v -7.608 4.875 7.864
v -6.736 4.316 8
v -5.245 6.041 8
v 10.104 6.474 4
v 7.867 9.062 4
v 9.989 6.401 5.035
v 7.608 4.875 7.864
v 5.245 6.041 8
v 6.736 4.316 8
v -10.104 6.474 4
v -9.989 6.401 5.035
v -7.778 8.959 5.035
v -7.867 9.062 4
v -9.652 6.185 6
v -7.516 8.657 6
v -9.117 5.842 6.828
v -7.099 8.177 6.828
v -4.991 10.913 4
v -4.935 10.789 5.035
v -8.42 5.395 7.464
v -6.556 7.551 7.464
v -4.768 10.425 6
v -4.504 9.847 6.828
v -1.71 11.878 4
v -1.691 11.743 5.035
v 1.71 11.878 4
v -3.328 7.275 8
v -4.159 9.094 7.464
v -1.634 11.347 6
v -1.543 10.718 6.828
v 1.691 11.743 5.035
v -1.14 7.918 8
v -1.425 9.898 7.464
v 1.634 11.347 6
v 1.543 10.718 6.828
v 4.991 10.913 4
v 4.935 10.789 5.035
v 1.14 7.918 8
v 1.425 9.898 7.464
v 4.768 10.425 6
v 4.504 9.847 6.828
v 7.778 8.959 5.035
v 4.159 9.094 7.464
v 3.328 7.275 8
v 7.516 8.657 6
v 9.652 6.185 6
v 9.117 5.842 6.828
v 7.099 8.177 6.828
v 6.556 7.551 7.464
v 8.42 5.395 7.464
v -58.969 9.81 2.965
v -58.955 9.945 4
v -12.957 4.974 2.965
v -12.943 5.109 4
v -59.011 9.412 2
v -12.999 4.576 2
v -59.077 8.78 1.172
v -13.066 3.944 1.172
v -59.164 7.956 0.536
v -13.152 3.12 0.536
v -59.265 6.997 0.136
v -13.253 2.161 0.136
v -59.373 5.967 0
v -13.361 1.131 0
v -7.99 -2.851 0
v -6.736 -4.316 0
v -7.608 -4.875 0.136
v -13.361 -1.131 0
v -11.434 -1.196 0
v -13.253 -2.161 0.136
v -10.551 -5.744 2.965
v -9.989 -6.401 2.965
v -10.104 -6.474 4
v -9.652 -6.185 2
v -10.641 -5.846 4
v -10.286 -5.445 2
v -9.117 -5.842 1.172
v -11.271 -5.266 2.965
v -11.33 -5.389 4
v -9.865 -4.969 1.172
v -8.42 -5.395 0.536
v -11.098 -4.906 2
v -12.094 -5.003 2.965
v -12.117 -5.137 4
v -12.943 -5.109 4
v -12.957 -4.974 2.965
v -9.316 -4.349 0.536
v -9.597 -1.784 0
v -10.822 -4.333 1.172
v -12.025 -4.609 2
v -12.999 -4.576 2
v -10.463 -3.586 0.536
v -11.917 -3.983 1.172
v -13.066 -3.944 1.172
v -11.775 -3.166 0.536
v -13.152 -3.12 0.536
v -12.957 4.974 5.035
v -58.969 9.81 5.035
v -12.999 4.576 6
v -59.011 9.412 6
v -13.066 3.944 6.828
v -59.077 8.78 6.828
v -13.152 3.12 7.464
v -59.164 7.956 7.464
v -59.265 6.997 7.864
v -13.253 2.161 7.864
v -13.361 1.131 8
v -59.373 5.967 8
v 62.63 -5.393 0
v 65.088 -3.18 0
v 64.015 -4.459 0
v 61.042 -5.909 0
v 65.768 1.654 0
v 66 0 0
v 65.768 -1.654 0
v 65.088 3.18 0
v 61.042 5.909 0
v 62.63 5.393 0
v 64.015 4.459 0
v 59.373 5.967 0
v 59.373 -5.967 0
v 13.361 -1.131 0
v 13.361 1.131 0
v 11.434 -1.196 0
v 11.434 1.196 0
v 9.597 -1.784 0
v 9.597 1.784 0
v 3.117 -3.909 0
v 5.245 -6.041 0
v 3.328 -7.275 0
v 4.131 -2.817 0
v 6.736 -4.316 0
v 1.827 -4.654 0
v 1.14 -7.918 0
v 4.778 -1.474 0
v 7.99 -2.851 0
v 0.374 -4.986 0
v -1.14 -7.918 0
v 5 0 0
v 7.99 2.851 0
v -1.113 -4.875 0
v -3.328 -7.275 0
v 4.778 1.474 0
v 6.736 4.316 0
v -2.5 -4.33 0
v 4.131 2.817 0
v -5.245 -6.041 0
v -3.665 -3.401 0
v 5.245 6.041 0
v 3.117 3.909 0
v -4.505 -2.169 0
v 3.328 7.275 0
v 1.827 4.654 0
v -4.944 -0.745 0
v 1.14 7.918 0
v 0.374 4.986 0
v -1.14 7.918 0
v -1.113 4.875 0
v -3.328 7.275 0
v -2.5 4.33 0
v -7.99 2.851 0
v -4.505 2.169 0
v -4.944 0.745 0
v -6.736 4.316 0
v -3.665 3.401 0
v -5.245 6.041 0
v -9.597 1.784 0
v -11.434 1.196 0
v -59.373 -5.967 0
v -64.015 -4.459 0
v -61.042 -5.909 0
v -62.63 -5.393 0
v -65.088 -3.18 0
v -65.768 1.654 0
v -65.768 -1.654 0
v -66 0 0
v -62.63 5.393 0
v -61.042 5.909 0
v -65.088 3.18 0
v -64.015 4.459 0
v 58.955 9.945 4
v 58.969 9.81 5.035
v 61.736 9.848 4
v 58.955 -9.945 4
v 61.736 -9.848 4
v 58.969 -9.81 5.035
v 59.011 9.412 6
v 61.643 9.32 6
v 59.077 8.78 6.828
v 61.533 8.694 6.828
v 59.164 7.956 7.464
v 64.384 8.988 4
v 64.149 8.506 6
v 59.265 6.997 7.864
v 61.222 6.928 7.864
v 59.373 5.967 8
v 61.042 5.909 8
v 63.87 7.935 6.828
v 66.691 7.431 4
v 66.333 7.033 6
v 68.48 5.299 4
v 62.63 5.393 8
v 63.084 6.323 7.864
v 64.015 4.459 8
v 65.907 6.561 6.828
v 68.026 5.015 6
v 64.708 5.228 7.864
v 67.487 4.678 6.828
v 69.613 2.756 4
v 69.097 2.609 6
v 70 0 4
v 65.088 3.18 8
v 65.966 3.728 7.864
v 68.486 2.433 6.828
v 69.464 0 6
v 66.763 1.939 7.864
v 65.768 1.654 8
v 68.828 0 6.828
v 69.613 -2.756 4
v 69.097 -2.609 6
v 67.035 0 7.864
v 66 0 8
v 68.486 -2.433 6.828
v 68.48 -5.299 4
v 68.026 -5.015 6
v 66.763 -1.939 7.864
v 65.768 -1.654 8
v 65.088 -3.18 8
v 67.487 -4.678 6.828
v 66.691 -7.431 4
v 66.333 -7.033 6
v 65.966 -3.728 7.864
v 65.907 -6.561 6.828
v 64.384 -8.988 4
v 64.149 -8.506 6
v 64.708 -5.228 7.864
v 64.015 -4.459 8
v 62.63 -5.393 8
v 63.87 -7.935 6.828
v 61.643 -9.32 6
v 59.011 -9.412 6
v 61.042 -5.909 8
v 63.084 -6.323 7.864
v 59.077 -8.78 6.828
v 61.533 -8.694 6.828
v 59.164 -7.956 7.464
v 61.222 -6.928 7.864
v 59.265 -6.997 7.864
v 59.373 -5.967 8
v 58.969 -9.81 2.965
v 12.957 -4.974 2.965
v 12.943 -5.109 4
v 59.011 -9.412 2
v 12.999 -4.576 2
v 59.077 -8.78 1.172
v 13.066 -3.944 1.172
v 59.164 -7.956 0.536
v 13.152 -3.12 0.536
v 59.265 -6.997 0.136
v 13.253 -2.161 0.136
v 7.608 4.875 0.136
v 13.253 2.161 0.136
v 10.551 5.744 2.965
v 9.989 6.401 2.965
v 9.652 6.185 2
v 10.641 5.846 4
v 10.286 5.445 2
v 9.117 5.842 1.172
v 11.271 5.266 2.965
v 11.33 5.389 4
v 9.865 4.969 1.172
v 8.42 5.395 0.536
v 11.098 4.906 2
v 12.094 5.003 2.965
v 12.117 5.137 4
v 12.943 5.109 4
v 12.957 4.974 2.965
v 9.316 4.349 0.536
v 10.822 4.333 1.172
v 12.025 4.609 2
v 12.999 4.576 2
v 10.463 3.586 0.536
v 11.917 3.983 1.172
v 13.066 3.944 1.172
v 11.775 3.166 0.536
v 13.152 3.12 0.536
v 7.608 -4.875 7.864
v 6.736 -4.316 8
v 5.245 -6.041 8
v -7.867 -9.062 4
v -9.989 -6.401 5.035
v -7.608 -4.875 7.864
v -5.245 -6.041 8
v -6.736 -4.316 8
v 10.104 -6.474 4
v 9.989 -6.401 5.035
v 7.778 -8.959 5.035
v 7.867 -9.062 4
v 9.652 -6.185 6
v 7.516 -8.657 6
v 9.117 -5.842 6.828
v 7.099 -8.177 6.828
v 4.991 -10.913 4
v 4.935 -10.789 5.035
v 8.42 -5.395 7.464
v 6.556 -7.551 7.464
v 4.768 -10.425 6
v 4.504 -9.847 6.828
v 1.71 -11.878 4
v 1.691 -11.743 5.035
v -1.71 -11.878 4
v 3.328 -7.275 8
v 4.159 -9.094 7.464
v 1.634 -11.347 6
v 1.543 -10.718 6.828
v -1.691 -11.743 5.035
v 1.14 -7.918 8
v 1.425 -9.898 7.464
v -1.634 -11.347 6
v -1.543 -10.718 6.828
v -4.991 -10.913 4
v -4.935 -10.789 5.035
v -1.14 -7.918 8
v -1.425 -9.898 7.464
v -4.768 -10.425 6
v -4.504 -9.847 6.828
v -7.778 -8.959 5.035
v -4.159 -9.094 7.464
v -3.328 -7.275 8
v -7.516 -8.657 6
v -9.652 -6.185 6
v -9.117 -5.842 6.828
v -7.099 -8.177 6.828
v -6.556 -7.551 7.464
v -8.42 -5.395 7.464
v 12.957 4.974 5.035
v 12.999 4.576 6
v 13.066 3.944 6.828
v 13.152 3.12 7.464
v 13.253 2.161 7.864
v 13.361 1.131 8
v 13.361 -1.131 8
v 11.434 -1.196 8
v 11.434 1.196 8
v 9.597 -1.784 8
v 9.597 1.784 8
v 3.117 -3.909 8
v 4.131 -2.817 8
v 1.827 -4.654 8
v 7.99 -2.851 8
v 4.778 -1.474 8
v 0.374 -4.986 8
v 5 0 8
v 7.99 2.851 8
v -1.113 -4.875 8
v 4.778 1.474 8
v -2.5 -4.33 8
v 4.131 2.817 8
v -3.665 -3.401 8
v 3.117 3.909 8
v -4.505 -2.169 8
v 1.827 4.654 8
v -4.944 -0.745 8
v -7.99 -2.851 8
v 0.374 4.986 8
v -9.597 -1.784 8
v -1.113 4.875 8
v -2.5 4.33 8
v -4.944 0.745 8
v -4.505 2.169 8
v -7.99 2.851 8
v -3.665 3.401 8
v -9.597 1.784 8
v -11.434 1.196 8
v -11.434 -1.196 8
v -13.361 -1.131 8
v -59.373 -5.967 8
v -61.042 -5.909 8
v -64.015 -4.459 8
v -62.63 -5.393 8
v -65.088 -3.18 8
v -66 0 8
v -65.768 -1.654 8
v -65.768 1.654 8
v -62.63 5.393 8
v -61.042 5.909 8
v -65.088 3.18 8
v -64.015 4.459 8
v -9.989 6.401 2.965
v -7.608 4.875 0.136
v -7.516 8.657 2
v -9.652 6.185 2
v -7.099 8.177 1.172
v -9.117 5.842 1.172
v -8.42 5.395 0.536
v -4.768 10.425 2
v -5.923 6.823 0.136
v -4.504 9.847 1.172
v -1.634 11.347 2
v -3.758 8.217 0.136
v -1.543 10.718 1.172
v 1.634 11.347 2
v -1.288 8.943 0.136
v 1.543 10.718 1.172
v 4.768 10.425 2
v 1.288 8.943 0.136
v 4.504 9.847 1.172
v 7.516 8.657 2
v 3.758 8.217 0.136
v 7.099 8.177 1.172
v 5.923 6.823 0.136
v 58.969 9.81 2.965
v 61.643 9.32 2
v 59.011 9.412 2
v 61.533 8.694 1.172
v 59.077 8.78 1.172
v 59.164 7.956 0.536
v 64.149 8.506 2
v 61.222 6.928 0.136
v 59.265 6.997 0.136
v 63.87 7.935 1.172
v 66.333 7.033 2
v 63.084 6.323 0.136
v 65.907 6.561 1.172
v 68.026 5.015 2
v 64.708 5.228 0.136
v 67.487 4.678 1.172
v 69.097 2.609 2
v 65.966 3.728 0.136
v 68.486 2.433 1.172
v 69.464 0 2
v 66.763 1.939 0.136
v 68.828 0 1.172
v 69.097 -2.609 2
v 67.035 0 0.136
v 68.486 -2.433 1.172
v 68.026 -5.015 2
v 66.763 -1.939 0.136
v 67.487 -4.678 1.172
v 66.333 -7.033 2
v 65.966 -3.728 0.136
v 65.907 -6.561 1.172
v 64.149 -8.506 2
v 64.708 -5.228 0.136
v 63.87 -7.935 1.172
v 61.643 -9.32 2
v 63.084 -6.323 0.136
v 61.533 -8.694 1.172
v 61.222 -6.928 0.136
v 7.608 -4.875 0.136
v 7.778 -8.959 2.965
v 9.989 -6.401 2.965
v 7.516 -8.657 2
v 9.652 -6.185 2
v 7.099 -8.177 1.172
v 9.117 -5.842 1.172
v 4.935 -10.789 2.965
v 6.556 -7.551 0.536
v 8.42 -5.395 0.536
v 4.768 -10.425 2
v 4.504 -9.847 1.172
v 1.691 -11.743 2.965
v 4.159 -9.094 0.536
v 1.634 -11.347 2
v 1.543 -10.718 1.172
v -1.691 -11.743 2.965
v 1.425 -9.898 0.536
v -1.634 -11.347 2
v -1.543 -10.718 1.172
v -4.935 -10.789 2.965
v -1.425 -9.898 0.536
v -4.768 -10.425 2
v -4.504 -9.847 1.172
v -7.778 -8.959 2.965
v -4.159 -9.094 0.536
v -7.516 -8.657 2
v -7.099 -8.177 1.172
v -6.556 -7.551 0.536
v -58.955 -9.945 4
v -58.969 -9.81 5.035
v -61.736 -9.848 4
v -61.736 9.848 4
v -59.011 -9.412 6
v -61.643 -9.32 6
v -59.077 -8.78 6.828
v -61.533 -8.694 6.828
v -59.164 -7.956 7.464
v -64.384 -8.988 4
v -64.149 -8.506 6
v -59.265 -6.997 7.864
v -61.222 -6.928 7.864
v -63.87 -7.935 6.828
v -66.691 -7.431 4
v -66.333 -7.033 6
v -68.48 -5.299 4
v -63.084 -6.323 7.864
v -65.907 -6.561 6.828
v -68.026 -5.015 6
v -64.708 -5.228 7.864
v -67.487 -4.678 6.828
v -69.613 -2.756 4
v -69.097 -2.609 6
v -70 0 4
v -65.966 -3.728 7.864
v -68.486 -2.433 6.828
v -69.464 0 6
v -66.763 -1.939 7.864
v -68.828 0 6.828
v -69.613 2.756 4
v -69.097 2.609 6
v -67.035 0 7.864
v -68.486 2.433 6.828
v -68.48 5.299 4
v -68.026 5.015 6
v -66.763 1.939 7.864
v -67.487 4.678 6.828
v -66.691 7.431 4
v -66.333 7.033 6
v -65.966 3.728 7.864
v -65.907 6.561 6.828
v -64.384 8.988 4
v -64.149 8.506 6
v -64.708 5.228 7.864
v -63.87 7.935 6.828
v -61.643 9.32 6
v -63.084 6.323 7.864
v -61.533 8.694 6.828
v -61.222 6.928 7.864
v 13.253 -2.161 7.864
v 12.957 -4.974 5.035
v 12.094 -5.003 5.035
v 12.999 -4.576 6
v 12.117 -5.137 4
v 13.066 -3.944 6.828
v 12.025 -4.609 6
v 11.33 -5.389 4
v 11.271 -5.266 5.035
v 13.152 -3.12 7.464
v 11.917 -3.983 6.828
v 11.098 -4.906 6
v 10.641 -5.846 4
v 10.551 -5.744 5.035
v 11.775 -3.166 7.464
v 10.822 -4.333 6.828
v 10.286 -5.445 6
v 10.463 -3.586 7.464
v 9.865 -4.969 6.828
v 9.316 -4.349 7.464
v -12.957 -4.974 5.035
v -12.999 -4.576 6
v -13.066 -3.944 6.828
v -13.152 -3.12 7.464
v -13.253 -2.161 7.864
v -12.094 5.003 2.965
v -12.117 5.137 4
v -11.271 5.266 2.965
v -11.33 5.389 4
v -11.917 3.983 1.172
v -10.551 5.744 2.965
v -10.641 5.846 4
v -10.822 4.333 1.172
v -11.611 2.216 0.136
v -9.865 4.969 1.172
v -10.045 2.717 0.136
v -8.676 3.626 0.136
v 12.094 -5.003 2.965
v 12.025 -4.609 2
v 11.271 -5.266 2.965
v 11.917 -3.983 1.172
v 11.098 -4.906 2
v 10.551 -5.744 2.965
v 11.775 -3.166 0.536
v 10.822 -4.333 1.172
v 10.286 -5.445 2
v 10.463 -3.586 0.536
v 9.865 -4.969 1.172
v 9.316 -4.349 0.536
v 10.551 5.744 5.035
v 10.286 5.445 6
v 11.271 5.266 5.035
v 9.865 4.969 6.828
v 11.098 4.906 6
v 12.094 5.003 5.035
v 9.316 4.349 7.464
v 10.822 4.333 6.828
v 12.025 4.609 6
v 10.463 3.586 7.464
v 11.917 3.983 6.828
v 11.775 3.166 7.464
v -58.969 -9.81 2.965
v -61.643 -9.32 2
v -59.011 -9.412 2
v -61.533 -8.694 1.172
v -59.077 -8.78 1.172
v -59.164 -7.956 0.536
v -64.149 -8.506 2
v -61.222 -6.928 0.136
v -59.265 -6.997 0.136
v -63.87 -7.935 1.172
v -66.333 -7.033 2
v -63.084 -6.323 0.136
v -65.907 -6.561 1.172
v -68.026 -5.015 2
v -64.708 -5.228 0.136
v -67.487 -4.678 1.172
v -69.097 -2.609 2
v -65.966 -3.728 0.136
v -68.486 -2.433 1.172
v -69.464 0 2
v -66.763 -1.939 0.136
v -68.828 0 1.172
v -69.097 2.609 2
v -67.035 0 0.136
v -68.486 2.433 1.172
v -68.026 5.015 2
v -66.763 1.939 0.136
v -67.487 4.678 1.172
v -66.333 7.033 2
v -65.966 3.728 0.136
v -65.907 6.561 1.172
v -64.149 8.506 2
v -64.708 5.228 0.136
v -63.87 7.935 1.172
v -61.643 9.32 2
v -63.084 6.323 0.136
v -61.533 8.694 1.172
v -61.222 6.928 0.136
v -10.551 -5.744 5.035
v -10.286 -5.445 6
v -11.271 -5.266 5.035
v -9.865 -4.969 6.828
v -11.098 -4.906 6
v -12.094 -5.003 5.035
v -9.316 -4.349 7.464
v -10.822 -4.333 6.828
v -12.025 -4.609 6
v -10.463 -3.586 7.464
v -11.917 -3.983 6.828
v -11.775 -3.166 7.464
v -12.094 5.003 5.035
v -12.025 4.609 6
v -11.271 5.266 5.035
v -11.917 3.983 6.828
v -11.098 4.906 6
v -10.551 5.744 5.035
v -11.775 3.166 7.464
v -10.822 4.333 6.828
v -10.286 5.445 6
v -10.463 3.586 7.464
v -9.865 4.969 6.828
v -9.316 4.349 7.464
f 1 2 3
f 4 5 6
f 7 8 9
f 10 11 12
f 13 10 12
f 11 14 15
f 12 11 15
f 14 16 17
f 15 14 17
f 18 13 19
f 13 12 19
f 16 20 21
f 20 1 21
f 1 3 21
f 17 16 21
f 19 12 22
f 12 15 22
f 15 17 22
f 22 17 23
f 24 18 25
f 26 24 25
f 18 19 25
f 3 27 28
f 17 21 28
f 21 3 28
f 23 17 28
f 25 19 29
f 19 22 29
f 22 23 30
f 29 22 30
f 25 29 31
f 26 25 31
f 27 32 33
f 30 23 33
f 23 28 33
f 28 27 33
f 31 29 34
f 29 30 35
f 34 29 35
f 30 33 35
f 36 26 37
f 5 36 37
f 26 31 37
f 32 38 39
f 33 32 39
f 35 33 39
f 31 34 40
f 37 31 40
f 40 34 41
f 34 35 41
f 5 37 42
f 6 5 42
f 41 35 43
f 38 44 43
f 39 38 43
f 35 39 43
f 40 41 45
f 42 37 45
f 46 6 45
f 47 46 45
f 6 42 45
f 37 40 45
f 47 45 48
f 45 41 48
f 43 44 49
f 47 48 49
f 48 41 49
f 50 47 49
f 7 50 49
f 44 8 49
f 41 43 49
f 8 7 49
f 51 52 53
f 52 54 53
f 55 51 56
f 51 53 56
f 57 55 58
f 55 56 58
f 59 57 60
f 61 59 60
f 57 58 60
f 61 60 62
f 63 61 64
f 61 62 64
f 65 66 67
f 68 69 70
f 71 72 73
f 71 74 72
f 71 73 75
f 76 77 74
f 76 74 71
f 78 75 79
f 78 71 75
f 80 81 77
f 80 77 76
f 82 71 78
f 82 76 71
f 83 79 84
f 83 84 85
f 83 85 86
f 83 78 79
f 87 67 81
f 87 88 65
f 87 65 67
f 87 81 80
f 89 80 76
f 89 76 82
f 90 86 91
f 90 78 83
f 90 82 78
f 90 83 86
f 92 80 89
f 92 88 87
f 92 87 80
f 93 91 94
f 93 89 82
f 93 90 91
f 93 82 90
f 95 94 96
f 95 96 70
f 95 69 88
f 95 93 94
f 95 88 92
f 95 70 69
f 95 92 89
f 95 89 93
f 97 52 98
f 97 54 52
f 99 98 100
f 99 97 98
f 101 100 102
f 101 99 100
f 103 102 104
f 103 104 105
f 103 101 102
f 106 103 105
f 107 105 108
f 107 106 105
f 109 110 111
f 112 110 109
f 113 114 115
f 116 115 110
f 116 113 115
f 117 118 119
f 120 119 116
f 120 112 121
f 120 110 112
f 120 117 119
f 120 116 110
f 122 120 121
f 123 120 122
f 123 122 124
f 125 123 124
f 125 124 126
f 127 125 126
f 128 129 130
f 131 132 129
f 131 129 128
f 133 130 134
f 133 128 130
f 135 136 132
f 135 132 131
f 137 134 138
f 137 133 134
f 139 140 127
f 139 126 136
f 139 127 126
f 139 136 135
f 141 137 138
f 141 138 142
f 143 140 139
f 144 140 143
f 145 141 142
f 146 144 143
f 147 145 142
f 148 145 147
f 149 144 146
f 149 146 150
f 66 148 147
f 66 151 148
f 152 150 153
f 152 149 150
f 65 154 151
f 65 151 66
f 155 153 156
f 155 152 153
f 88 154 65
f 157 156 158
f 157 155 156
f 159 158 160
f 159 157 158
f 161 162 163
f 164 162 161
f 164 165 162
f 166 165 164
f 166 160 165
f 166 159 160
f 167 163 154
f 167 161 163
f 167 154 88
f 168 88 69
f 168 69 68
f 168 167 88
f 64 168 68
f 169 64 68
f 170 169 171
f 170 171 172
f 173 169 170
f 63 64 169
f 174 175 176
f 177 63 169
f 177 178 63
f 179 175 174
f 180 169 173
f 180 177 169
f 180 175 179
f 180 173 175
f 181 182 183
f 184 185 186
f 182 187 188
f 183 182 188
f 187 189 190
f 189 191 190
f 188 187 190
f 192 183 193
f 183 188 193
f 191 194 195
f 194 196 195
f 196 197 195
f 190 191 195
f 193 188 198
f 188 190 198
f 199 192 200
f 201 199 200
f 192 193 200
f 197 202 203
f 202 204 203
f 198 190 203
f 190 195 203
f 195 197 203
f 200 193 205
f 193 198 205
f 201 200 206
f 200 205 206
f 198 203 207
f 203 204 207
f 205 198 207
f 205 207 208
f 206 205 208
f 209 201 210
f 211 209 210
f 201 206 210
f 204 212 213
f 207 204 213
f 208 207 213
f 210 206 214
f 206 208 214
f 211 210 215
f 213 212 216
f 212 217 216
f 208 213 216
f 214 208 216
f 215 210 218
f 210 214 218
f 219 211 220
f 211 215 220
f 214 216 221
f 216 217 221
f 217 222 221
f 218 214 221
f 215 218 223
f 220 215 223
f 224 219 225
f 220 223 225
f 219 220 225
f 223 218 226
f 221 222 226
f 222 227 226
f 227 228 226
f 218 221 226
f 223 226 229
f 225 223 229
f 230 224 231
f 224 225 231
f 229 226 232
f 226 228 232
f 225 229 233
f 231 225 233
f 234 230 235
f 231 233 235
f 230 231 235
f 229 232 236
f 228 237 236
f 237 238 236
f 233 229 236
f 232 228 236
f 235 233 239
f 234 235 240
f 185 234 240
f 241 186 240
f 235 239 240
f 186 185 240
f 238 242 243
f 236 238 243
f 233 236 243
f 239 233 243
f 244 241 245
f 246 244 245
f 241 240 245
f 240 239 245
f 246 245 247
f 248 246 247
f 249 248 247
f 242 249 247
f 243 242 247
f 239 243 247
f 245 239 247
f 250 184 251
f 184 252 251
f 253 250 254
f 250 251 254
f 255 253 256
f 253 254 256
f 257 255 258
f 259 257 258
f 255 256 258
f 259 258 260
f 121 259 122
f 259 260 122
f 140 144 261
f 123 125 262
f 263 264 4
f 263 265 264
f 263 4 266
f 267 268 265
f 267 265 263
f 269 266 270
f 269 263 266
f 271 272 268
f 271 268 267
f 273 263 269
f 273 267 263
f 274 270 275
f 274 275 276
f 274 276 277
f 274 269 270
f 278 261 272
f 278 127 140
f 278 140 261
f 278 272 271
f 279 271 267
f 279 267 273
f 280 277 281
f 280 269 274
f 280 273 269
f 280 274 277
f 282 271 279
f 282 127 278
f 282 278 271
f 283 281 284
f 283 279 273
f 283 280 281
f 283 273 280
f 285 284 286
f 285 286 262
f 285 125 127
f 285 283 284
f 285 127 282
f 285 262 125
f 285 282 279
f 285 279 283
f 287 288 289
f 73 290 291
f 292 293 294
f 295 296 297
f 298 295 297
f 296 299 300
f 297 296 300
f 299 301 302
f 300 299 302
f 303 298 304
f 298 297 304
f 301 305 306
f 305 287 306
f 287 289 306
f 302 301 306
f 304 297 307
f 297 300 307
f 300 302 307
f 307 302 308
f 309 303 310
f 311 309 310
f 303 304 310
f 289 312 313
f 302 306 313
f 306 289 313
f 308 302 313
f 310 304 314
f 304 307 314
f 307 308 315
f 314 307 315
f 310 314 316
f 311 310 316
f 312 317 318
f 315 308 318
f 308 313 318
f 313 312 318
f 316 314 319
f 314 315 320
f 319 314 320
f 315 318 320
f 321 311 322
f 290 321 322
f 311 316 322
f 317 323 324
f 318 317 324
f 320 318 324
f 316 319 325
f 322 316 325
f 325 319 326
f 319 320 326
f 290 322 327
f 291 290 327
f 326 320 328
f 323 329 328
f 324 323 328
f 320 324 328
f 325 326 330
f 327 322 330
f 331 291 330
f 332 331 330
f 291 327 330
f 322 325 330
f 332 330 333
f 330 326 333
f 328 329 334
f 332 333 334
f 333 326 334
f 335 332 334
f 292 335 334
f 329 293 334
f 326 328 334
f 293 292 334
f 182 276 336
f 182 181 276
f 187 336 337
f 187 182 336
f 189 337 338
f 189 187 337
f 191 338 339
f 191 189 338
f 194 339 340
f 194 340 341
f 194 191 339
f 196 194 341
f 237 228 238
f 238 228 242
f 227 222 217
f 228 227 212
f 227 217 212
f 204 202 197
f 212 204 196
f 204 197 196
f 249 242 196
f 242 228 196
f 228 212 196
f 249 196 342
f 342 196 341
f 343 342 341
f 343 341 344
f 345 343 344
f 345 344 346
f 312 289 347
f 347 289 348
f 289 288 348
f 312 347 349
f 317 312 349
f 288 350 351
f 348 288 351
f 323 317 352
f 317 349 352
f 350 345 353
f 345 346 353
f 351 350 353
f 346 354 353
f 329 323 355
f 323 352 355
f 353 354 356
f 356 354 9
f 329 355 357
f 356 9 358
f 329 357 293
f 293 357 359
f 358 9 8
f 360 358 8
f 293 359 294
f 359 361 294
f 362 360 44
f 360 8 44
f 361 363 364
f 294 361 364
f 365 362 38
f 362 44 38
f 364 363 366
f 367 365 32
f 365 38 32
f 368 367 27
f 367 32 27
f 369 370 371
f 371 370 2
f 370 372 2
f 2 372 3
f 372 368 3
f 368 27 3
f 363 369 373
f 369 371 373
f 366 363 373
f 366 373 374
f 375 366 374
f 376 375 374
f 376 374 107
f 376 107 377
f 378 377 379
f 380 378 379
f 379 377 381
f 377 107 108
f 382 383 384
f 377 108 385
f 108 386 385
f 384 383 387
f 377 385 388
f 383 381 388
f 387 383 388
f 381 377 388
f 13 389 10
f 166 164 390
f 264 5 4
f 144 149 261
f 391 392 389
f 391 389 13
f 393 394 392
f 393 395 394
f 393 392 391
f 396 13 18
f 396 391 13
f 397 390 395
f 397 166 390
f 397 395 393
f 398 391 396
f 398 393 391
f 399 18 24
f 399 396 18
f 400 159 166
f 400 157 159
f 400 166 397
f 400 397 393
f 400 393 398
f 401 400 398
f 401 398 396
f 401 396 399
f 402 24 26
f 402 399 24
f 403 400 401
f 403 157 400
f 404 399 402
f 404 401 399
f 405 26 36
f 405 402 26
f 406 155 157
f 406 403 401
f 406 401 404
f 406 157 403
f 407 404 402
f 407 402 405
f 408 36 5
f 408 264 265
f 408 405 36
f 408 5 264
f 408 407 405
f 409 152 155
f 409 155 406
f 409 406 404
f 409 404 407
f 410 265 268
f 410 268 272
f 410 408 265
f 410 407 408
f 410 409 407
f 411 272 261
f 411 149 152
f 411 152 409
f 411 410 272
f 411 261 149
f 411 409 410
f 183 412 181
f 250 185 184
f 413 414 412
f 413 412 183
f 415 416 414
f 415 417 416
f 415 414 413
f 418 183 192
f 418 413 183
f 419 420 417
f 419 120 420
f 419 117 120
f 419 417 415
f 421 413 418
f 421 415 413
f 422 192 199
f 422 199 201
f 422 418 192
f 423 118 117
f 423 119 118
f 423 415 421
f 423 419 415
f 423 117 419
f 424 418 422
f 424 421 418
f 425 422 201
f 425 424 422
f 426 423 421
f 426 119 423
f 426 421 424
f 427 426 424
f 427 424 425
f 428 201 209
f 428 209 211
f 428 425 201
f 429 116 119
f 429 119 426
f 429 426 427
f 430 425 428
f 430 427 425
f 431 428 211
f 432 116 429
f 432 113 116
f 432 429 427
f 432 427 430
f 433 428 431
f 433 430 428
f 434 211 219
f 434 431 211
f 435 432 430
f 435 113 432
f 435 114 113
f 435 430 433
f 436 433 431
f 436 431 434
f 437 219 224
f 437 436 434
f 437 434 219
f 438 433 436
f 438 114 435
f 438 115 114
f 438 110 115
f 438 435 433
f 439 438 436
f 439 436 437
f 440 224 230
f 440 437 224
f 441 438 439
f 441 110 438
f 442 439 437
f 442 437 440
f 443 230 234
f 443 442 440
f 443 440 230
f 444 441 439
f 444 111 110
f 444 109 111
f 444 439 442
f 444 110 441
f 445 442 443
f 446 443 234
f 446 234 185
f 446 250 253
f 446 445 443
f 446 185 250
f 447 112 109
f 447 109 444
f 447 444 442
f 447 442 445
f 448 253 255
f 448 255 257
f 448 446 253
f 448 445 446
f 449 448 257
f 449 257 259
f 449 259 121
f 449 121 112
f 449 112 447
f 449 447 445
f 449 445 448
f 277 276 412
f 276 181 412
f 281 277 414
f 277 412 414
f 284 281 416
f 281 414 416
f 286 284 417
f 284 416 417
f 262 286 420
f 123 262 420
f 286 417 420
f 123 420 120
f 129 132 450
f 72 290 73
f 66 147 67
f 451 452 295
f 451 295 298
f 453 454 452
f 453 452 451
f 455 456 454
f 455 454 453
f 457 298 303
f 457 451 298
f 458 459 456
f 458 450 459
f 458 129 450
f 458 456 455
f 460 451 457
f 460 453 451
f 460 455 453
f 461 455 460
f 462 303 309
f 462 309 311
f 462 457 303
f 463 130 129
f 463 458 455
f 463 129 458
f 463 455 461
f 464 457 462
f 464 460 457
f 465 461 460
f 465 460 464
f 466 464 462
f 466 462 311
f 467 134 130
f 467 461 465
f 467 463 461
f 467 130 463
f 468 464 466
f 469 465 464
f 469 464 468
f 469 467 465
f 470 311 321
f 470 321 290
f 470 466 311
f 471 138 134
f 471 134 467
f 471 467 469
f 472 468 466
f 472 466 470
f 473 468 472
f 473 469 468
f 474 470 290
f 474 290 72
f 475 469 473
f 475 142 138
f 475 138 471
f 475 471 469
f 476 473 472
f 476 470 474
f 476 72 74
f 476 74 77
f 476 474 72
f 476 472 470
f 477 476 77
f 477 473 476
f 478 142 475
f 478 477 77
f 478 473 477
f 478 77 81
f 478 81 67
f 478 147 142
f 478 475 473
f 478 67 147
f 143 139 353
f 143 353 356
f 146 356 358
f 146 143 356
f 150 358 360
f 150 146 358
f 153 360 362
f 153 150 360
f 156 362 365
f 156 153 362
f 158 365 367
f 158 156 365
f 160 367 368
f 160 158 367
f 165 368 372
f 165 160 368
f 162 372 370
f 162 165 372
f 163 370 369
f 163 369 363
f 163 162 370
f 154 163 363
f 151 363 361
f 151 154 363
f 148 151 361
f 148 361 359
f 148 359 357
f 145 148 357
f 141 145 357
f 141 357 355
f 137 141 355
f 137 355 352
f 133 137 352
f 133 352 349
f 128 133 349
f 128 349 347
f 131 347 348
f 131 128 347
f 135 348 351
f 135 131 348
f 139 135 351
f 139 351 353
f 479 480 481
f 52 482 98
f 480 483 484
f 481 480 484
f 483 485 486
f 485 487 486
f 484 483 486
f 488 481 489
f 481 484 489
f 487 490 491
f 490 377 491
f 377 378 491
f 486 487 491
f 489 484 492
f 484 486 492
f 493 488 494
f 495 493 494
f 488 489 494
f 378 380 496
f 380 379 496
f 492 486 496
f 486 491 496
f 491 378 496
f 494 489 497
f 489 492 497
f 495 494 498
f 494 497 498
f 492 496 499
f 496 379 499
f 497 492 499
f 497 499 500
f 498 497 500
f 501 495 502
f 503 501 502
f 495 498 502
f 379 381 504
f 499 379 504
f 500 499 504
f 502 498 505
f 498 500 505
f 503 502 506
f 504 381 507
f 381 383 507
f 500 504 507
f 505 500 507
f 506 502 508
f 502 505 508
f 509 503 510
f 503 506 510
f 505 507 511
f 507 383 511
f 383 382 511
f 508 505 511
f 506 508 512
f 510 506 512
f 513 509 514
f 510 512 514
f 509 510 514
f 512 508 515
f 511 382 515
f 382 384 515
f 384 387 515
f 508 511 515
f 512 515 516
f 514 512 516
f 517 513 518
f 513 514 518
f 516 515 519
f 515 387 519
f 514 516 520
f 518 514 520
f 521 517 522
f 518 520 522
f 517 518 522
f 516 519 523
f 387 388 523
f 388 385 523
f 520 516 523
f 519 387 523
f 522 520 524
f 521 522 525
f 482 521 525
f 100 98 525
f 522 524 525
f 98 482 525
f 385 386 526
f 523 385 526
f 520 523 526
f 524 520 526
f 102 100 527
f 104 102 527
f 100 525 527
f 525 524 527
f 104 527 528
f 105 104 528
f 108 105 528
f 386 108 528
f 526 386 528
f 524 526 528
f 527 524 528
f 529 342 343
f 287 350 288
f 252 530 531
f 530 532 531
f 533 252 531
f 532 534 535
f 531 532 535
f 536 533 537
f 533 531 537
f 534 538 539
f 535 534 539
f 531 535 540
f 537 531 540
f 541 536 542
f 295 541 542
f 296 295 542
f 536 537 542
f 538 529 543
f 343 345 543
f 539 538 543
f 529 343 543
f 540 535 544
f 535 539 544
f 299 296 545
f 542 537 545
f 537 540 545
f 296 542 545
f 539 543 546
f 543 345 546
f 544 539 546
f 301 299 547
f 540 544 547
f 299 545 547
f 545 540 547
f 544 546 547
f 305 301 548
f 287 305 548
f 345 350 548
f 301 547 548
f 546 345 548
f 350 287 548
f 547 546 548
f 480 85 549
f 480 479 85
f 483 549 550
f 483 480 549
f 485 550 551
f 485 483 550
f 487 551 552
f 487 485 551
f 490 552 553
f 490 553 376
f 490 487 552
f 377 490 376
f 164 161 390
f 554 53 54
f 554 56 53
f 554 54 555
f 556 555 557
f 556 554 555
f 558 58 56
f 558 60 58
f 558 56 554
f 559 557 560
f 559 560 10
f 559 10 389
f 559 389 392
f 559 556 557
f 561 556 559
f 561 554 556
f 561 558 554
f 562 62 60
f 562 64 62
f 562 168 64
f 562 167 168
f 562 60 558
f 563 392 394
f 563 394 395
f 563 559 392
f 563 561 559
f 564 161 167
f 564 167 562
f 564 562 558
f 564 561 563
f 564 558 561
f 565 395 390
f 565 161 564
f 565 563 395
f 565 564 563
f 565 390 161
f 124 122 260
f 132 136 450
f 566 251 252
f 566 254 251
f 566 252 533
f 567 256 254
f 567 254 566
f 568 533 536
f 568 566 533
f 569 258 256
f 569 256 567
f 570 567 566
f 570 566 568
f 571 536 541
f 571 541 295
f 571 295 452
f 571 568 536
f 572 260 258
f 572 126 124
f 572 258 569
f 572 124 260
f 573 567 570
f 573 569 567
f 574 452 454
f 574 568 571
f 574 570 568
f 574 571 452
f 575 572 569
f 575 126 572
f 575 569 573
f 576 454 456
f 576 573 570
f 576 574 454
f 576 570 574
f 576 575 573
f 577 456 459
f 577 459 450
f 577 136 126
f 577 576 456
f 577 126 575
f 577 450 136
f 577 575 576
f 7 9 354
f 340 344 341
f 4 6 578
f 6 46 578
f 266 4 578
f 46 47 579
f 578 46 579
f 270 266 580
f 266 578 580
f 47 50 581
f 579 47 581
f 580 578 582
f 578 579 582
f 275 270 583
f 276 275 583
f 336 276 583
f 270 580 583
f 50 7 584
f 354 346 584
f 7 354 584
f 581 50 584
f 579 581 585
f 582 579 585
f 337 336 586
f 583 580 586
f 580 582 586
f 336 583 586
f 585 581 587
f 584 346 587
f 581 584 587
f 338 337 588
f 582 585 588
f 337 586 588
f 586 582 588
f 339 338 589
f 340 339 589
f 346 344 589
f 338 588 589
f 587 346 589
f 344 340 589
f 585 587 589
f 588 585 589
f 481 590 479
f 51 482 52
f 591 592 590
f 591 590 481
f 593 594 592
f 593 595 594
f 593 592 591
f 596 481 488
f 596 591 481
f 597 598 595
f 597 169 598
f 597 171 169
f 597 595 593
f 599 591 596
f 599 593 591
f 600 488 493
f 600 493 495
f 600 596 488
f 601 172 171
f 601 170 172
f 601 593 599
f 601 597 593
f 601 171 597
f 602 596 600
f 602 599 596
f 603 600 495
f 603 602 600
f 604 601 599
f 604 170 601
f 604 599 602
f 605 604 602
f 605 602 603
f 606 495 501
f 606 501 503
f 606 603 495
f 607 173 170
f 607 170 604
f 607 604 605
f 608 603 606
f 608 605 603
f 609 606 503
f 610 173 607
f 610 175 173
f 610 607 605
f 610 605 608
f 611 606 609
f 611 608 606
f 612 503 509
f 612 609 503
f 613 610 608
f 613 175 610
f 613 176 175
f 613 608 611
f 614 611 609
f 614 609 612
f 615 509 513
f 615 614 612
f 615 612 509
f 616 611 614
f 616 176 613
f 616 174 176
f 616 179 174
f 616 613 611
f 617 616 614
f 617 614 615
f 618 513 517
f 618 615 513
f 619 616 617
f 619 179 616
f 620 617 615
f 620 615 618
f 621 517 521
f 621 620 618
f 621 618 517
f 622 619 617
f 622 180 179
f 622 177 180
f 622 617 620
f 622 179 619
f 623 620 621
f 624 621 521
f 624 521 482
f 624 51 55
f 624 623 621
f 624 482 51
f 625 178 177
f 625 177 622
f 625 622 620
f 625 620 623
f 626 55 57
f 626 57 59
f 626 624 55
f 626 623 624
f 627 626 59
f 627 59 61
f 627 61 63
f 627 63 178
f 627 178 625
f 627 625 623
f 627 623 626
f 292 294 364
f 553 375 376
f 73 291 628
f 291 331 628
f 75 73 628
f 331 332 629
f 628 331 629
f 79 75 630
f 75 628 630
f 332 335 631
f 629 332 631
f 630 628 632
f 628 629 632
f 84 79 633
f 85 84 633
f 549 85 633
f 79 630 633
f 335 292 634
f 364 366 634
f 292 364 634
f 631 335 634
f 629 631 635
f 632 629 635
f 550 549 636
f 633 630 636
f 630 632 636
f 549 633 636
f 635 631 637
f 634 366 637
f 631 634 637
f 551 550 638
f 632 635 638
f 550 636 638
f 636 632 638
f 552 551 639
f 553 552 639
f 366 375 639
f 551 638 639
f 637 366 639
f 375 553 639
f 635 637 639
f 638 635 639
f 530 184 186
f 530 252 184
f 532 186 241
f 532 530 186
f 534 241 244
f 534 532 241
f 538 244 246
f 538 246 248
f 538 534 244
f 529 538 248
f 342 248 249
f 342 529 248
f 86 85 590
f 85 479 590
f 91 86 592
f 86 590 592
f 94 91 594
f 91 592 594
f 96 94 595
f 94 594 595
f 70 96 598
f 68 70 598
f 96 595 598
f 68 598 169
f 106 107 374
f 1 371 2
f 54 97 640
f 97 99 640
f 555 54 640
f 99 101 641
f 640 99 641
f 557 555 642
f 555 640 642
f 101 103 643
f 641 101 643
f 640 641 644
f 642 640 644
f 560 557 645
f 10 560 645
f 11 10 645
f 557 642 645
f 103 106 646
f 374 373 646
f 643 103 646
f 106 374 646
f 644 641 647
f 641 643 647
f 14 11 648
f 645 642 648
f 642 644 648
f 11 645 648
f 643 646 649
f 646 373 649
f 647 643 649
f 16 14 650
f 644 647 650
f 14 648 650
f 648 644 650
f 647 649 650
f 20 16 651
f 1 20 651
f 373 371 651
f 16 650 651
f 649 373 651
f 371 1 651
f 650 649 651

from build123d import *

# Parameters (mm, degrees)
SKETCH1_R           = 5
BOSS_EXTRUDE1_DEPTH = 8
FILLET1_R           = 4


with BuildPart() as part:
    # Sketch1 → Boss-Extrude1 (new body)
    with BuildSketch(Plane.XY):
        with BuildLine():
            Line((12.943190902, 5.109212861), (58.954715367, 9.945218954))
            ThreePointArc((58.954715367, 9.945218954), (70, 0), (58.954715367, -9.945218954))
            Line((58.954715367, -9.945218954), (12.943190902, -5.109212861))
            ThreePointArc((12.943190902, -5.109212861), (11.32982846, -5.388970193), (10.103684409, -6.474222838))
            ThreePointArc((10.103684409, -6.474222838), (0, -12), (-10.103684409, -6.474222838))
            ThreePointArc((-10.103684409, -6.474222838), (-11.32982846, -5.388970193), (-12.943190902, -5.109212861))
            Line((-12.943190902, -5.109212861), (-58.954715367, -9.945218954))
            ThreePointArc((-58.954715367, -9.945218954), (-70, 0), (-58.954715367, 9.945218954))
            Line((-58.954715367, 9.945218954), (-12.943190902, 5.109212861))
            ThreePointArc((-12.943190902, 5.109212861), (-11.32982846, 5.388970193), (-10.103684409, 6.474222838))
            ThreePointArc((-10.103684409, 6.474222838), (0, 12), (10.103684409, 6.474222838))
            ThreePointArc((10.103684409, 6.474222838), (11.32982846, 5.388970193), (12.943190902, 5.109212861))
        make_face()
        Circle(SKETCH1_R, mode=Mode.SUBTRACT)
    extrude(amount=BOSS_EXTRUDE1_DEPTH)

    # Fillet1
    fillet1_edges = [part.edges().sort_by_distance(p)[0] for p in [
        (0, 12, 0),
        (-11.32982846, -5.388970193, 0),
        (70, 0, 8),
        (-35.948953134, -7.527215907, 0),
        (-70, 0, 0),
        (-35.948953134, 7.527215907, 0),
        (-11.32982846, 5.388970193, 0),
        (11.32982846, 5.388970193, 0),
        (35.948953134, 7.527215907, 0),
        (35.948953134, -7.527215907, 0),
        (11.32982846, -5.388970193, 0),
        (35.948953134, 7.527215907, 8),
        (-35.948953134, 7.527215907, 8),
        (-35.948953134, -7.527215907, 8),
        (35.948953134, -7.527215907, 8),
    ]]
    fillet(fillet1_edges, radius=FILLET1_R - 0.0001)  # a hair under: the kernel refuses the full size


solid = part.part
